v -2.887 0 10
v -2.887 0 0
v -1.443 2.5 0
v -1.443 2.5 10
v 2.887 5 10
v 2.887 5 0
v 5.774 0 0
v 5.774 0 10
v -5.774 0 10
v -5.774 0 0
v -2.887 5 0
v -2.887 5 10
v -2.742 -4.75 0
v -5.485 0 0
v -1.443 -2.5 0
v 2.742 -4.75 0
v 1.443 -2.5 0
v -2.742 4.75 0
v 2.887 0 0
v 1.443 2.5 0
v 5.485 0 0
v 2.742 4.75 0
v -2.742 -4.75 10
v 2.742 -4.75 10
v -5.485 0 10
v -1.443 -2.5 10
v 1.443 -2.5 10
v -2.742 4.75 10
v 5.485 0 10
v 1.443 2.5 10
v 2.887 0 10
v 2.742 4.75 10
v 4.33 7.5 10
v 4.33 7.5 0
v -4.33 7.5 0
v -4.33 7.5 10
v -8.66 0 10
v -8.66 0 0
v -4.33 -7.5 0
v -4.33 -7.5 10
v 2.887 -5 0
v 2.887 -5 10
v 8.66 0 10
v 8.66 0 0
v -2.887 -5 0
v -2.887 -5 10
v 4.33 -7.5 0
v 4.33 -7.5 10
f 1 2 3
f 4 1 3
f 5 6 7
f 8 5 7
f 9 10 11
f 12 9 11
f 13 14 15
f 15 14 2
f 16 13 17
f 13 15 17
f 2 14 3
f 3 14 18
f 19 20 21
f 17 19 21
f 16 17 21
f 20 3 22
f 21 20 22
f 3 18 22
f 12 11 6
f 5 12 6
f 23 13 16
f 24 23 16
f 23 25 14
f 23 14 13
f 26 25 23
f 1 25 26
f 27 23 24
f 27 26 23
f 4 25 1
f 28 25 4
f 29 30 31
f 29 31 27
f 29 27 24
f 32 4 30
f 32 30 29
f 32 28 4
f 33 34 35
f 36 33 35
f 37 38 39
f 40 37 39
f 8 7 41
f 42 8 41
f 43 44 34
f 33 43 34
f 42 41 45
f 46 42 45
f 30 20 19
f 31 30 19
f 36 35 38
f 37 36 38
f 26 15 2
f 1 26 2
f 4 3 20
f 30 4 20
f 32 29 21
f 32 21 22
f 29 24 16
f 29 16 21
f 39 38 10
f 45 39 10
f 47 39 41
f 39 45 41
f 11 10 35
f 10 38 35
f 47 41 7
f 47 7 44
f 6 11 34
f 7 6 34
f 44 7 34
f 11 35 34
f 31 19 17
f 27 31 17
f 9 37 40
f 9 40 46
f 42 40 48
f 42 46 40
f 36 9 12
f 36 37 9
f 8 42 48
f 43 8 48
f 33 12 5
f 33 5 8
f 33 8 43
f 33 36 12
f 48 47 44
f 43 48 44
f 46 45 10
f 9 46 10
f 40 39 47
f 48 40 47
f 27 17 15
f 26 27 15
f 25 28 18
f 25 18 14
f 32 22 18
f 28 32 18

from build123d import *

# Parameters (mm, degrees)
F1_DEPTH = 10


with BuildPart() as f1:
    # F0 (on Top) → F1 (new body)
    with BuildSketch(Plane.XY):
        Polygon((2.7424137787, 4.75), (-2.7424137787, 4.75), (-5.4848275573, 0), (-2.7424137787, -4.75), (2.7424137787, -4.75), (5.4848275573, 0), align=None)
        Polygon((-2.8867513459, 0), (-1.443375673, 2.5), (1.443375673, 2.5), (2.8867513459, 0), (1.443375673, -2.5), (-1.443375673, -2.5), align=None, mode=Mode.SUBTRACT)
    extrude(amount=F1_DEPTH)


with BuildPart() as f1b:
    # F0 (on Top) → F1, piece 2 (new body)
    with BuildSketch(Plane.XY):
        Polygon((4.3301270189, 7.5), (-4.3301270189, 7.5), (-8.6602540378, 0), (-4.3301270189, -7.5), (4.3301270189, -7.5), (8.6602540378, 0), align=None)
        Polygon((-5.7735026919, 0), (-2.8867513459, 5), (2.8867513459, 5), (5.7735026919, 0), (2.8867513459, -5), (-2.8867513459, -5), align=None, mode=Mode.SUBTRACT)
    extrude(amount=F1_DEPTH)


solid = Compound([f1.part, f1b.part])
